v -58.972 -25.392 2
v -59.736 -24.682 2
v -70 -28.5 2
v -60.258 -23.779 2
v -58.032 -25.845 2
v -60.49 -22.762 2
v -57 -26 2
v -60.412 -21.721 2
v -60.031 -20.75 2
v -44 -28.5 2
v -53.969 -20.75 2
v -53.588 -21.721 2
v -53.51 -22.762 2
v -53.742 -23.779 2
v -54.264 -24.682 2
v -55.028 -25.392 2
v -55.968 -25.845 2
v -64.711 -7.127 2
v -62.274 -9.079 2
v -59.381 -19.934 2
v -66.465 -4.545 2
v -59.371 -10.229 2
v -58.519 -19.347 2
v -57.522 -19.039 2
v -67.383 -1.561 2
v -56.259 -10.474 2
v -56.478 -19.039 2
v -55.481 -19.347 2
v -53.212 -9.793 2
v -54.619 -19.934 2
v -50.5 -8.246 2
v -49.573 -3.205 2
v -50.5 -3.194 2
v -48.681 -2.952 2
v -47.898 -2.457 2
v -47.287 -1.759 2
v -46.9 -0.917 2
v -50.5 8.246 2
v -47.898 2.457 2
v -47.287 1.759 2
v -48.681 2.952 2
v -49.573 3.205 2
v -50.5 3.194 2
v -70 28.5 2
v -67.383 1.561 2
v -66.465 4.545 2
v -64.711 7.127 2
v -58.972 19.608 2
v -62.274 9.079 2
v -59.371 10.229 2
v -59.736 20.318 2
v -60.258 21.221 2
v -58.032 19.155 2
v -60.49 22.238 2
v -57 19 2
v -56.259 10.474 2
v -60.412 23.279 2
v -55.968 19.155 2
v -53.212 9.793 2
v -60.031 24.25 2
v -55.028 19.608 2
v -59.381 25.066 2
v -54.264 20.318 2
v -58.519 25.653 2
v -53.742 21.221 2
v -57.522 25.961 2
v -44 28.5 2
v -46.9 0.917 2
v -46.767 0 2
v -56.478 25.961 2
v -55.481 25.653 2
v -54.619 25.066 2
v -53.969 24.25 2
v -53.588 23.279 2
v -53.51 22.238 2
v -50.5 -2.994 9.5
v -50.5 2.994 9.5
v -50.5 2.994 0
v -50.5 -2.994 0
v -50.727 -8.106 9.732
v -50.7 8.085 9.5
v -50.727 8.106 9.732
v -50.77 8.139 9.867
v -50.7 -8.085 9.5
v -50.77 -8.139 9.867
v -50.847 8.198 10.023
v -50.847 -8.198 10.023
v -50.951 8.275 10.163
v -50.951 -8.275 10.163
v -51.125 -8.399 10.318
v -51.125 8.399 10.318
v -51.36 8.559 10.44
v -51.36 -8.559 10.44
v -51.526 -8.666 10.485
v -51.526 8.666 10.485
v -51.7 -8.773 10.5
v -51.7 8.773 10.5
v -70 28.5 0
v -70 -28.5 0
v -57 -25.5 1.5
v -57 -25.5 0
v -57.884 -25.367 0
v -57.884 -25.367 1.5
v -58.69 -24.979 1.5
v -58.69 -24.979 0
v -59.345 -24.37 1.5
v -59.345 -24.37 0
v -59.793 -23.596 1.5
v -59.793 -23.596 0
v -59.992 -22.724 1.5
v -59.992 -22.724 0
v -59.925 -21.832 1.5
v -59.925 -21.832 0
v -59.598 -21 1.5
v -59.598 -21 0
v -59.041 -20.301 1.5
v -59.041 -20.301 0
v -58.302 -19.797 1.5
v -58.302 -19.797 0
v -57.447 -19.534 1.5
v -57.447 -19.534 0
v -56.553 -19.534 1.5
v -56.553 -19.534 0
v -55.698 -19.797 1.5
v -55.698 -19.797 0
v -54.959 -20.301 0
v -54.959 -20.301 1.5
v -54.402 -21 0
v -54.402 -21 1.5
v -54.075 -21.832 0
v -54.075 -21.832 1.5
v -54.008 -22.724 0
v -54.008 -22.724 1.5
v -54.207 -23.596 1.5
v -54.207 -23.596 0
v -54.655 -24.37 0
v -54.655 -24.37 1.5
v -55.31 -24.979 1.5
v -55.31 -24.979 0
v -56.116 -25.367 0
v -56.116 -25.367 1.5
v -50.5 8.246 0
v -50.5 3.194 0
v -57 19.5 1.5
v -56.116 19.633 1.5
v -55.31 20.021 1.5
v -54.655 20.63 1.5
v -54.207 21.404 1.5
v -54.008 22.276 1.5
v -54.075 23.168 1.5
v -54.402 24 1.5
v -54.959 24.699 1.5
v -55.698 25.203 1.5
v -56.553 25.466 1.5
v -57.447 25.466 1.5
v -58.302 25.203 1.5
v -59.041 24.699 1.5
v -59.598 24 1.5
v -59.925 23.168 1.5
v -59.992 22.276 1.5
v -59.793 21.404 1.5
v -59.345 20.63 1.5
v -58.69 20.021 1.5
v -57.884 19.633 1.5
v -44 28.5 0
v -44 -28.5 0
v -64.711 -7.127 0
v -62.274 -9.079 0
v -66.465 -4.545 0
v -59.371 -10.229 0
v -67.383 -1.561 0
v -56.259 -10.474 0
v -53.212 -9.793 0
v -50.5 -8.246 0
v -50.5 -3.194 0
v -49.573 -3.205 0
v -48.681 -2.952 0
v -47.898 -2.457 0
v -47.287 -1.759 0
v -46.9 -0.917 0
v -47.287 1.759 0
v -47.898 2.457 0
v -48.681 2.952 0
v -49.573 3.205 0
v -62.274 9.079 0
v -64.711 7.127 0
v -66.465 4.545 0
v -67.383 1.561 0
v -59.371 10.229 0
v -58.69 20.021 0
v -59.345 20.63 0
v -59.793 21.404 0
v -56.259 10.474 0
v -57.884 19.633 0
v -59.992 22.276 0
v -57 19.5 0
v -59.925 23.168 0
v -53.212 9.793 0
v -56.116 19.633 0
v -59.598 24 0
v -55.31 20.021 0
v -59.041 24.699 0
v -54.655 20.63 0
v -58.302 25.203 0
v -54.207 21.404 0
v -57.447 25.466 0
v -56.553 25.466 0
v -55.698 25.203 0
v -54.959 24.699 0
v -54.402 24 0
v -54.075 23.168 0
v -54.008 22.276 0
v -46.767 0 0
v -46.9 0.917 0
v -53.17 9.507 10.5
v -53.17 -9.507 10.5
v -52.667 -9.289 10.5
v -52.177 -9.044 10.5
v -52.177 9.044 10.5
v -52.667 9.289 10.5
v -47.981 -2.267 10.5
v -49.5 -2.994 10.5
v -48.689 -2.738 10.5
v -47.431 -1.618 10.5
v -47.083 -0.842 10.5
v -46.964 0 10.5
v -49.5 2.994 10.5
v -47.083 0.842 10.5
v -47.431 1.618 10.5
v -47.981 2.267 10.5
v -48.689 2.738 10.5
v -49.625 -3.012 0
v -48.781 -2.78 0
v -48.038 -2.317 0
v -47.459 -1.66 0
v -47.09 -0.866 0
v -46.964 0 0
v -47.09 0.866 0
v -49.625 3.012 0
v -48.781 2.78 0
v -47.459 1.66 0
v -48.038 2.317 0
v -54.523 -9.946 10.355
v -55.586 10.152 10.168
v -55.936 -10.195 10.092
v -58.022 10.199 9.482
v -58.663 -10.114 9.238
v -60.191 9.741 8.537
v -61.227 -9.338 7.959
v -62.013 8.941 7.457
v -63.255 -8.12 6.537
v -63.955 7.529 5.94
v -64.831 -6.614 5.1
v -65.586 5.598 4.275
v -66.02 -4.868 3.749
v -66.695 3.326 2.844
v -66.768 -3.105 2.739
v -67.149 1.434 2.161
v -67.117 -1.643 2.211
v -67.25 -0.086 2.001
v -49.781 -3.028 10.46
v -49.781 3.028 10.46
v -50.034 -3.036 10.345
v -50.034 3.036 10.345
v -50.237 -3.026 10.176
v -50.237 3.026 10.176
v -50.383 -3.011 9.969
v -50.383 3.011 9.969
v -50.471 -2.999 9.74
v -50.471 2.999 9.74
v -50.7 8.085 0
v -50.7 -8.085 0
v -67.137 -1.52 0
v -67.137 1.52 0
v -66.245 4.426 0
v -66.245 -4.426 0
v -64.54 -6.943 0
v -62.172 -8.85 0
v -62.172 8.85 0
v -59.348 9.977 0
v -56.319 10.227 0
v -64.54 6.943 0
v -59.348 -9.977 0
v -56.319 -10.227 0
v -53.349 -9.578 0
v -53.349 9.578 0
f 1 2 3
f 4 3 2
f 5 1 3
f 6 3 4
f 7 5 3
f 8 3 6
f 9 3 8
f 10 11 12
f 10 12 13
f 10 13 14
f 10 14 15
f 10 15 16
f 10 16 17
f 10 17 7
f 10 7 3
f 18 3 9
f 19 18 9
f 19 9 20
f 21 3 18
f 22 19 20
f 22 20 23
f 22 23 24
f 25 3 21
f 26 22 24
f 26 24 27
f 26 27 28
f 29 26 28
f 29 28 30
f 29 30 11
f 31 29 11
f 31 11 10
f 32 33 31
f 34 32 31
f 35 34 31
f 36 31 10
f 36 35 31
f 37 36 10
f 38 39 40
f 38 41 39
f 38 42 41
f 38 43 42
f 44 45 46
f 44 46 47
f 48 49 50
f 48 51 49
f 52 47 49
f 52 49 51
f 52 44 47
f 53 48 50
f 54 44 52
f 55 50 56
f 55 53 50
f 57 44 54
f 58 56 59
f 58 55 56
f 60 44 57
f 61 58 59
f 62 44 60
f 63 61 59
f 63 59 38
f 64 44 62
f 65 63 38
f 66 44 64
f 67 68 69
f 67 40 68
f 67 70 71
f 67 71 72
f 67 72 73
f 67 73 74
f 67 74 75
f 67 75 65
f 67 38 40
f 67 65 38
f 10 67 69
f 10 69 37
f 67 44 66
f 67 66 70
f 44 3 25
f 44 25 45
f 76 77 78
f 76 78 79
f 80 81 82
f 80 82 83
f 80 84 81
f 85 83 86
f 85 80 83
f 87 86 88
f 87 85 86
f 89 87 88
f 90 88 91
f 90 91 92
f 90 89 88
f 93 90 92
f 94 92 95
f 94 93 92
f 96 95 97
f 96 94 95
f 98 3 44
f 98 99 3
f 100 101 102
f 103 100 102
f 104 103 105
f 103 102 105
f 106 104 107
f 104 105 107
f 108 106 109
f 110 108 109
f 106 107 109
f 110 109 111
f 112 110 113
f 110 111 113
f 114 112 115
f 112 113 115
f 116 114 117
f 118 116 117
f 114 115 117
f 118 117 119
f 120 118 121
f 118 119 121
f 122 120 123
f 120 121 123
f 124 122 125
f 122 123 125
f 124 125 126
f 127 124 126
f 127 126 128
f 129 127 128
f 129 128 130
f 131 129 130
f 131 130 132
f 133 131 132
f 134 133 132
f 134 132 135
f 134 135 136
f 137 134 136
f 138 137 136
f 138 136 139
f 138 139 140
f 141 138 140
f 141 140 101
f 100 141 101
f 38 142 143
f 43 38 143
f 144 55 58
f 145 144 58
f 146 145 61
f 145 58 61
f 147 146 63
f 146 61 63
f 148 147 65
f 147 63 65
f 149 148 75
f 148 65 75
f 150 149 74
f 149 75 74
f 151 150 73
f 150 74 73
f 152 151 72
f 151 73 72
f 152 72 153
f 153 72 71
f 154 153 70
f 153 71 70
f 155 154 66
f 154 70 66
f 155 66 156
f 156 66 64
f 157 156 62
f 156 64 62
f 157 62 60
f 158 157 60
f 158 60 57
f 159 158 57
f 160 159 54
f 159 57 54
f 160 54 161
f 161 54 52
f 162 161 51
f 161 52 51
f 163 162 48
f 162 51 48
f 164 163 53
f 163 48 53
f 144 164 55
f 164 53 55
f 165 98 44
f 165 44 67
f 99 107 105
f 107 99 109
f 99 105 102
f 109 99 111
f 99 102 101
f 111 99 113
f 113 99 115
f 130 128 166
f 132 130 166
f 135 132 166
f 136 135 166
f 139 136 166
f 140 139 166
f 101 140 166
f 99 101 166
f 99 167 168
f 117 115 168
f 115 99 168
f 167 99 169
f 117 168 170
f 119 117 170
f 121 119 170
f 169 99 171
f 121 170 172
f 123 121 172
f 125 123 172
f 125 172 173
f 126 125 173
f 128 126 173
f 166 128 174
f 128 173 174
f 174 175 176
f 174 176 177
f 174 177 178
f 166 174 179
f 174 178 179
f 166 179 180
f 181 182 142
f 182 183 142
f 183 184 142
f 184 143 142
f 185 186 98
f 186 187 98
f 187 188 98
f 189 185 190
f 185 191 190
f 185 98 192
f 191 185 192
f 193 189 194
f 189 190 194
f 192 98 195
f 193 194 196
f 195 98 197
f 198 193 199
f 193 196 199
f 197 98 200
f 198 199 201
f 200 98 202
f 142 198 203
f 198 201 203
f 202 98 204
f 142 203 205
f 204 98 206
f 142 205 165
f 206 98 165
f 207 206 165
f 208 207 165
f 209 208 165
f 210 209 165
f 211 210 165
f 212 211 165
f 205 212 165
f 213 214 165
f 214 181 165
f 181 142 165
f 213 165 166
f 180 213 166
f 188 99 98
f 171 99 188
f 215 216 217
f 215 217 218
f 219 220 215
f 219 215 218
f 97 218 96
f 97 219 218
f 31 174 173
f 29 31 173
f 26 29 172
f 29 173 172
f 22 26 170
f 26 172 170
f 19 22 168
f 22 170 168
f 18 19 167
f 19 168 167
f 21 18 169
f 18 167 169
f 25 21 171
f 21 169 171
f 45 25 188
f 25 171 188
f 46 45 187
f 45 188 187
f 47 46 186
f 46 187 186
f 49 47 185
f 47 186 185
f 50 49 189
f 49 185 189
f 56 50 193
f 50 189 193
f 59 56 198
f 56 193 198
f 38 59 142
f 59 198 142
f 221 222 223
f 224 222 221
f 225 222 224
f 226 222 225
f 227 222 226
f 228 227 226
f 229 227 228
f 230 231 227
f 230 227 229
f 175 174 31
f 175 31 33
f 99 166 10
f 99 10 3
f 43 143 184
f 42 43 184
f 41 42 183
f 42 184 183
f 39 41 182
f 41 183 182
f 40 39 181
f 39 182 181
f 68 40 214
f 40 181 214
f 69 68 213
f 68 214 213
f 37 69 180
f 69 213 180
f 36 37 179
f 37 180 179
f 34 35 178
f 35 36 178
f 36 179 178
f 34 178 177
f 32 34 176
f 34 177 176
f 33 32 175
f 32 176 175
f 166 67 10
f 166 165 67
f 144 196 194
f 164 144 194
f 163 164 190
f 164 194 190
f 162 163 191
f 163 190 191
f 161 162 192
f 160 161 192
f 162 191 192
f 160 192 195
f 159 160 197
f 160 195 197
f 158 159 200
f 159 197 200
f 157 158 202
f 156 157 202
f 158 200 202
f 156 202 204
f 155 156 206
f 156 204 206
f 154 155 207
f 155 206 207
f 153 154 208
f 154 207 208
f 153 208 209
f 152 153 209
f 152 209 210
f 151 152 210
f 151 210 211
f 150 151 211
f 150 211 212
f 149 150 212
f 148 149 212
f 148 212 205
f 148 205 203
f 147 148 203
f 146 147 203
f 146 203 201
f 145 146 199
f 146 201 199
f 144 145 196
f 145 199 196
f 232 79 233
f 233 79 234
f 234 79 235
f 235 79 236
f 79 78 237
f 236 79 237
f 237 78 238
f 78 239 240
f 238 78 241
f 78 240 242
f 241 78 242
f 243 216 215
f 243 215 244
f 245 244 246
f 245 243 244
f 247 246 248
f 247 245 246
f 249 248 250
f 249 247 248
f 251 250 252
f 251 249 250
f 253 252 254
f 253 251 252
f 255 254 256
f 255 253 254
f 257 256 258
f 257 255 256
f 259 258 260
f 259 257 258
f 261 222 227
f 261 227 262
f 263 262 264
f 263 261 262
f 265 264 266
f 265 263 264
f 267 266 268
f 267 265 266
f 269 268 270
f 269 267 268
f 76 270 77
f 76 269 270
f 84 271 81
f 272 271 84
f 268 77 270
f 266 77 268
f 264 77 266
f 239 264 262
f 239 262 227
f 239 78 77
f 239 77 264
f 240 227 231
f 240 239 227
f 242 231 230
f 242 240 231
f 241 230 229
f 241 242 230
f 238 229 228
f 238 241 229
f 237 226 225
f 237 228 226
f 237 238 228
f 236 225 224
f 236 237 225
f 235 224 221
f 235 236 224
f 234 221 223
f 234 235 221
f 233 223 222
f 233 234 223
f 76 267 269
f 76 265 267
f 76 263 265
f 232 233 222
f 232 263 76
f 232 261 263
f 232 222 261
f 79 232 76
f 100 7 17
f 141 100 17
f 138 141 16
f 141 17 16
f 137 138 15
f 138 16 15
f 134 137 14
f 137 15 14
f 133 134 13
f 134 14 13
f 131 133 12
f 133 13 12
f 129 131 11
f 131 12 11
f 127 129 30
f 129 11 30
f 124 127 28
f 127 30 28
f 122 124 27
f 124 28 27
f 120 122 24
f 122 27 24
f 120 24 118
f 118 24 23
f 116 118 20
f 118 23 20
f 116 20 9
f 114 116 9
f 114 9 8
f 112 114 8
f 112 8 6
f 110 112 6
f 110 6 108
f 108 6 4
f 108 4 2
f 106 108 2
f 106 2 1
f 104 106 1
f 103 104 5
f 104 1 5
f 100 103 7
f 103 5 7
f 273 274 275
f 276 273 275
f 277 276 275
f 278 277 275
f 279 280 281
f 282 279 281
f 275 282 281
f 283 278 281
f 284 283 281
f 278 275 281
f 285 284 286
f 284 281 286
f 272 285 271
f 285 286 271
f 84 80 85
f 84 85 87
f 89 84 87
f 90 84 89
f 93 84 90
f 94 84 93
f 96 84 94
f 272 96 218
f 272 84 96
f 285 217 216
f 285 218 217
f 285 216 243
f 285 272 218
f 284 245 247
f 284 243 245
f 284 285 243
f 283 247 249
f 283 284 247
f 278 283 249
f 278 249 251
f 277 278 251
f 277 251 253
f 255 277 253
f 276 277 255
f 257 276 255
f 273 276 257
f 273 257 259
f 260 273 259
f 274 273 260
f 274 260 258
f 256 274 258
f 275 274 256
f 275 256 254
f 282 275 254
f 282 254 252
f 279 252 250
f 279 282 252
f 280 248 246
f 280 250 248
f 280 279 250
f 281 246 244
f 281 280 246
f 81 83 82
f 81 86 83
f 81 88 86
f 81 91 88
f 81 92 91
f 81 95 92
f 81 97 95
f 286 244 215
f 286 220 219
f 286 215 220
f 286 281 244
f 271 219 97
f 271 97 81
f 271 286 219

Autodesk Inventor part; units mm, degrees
ref_plane "YZ Plane" through (0, 0, 0) normal (1, 0, 0) x (0, 1, 0)
sketch "Boceto1" plane through (-57, 0, 0) normal (0, 0, 1) x (1, 0, 0)
  line L0 (-13, 28.5) -> (13, 28.5)
  line L1 (13, 28.5) -> (13, -28.5)
  line L2 (13, -28.5) -> (-13, -28.5)
  line L3 (-13, -28.5) -> (-13, 28.5)
  line L4 (-13, 28.5) -> (13, -28.5) construction
  line L5 (13, 28.5) -> (-13, -28.5) construction
  circle A0 centre (0, 0) radius 10.5 projected
  line L6 (6.5, -8.2462) -> (6.5, -3.1943)
  line L7 (6.5, 8.2462) -> (6.5, 3.1943)
  line L8 (10.2924, 0) -> (-1.6343, 0) construction
  arc A1 (6.5, -3.1943) -> (6.5, 3.1943) centre (7, 0) ccw
  arc A2 (6.5, -8.2462) -> (6.5, 8.2462) centre (0, 0) ccw construction
  point P0 (5.5, 0)
  dimension "d27" = 13
  dimension "d68" = 6.5
  dimension "d69" = 3.2332
  dimension "d72" = 0.5
  dimension "d105" = 28.5
  dimension "d106" = 26
  dimension "d107" = 57
extrude "Extrusión1" add sketch "Boceto1" along normal blind 2 contours L0 L1 L2 L3 | A0 L6 A1 L7 picked at (7.0604, -6.0073)
ref_plane "Plano de trabajo1" through (-57, 0, 0) normal (0, 0, -1) x (-1, 0, 0)
sketch "Boceto2" plane through (-57, 0, 0) normal (0, 0, 1) x (1, 0, 0)
  line L0 (6.5, 2.9943) -> (6.5, -2.9943)
  arc A0 (6.5, -2.9943) -> (6.5, 2.9943) centre (7, 0) ccw
  line L1 (6.3, 8.0853) -> (6.3, -8.0853)
  arc A1 (6.3, 8.0853) -> (6.3, -8.0853) centre (0, 0) ccw
  point P0 (6.5, 0)
  dimension "d41" = 3.0357
  dimension "d42" = 0.5
  dimension "d43" = 0.2
  dimension "d111" = 20.5
extrude "Extrusión2" add sketch "Boceto2" along normal blind 10.5
ref_plane "Plano de trabajo2" through (-70, -28.5, 0) normal (0, -1, 0) x (1, 0, 0)
sketch "Boceto3" plane through (-57, -28.5, 0) normal (0, -1, 0) x (1, 0, 0)
  line L0 (6.3, 2) -> (-10.25, 2)
  arc A0 (6.3, 10.5) -> (-10.25, 2) centre (5.0652, -7.4576) ccw
  line L1 (6.3, 2) -> (6.3, 10.5)
  line L2 (6.3, 10.5) -> (-10.25, 10.5)
  line L3 (-10.25, 10.5) -> (-10.25, 2)
  point P0 (57, 0)
  point P1 (3.8303, 10.5)
  dimension "d110" = 18
extrude "Extrusión3" cut sketch "Boceto3" against normal up to surface (57 mm away) contours L3 L2 A0
fillet "Empalme3" radius 1 2 edges at (-50.7, 0, 10.5) (-50.5, 0, 10.5)
sketch "Boceto12" plane through (-57, 0, 2) normal (0, 0, 1) x (1, 0, 0)
  circle A0 centre (0, 22.5) radius 3
  line L0 (13, 28.5) -> (-13, 28.5) projected
  circle A1 centre (0, -22.5) radius 3
  line L1 (-13, -28.5) -> (13, -28.5) projected
  line L2 (13, -28.5) -> (13, 28.5) projected
  line L3 (-13, 28.5) -> (-13, -28.5) projected
  point P0 (57, 0)
  dimension "d114" = 6
  dimension "d115" = 6
  dimension "d116" = 6
  dimension "d117" = 6
  dimension "d118" = 13
  dimension "d119" = 13
  dimension "d120" = 13
  dimension "d121" = 13
  dimension "d122" = 45
hole "Agujero2" at (-57, 22.5, 2) at (-57, -22.5, 2) direction (0, 0, -1) diameter 6 depth 2 countersink diameter 7 countersink angle 90
properties part number "LOK-58 CERRADURA PICAPORTE (PASADOR)" material "Acero inoxidable"
